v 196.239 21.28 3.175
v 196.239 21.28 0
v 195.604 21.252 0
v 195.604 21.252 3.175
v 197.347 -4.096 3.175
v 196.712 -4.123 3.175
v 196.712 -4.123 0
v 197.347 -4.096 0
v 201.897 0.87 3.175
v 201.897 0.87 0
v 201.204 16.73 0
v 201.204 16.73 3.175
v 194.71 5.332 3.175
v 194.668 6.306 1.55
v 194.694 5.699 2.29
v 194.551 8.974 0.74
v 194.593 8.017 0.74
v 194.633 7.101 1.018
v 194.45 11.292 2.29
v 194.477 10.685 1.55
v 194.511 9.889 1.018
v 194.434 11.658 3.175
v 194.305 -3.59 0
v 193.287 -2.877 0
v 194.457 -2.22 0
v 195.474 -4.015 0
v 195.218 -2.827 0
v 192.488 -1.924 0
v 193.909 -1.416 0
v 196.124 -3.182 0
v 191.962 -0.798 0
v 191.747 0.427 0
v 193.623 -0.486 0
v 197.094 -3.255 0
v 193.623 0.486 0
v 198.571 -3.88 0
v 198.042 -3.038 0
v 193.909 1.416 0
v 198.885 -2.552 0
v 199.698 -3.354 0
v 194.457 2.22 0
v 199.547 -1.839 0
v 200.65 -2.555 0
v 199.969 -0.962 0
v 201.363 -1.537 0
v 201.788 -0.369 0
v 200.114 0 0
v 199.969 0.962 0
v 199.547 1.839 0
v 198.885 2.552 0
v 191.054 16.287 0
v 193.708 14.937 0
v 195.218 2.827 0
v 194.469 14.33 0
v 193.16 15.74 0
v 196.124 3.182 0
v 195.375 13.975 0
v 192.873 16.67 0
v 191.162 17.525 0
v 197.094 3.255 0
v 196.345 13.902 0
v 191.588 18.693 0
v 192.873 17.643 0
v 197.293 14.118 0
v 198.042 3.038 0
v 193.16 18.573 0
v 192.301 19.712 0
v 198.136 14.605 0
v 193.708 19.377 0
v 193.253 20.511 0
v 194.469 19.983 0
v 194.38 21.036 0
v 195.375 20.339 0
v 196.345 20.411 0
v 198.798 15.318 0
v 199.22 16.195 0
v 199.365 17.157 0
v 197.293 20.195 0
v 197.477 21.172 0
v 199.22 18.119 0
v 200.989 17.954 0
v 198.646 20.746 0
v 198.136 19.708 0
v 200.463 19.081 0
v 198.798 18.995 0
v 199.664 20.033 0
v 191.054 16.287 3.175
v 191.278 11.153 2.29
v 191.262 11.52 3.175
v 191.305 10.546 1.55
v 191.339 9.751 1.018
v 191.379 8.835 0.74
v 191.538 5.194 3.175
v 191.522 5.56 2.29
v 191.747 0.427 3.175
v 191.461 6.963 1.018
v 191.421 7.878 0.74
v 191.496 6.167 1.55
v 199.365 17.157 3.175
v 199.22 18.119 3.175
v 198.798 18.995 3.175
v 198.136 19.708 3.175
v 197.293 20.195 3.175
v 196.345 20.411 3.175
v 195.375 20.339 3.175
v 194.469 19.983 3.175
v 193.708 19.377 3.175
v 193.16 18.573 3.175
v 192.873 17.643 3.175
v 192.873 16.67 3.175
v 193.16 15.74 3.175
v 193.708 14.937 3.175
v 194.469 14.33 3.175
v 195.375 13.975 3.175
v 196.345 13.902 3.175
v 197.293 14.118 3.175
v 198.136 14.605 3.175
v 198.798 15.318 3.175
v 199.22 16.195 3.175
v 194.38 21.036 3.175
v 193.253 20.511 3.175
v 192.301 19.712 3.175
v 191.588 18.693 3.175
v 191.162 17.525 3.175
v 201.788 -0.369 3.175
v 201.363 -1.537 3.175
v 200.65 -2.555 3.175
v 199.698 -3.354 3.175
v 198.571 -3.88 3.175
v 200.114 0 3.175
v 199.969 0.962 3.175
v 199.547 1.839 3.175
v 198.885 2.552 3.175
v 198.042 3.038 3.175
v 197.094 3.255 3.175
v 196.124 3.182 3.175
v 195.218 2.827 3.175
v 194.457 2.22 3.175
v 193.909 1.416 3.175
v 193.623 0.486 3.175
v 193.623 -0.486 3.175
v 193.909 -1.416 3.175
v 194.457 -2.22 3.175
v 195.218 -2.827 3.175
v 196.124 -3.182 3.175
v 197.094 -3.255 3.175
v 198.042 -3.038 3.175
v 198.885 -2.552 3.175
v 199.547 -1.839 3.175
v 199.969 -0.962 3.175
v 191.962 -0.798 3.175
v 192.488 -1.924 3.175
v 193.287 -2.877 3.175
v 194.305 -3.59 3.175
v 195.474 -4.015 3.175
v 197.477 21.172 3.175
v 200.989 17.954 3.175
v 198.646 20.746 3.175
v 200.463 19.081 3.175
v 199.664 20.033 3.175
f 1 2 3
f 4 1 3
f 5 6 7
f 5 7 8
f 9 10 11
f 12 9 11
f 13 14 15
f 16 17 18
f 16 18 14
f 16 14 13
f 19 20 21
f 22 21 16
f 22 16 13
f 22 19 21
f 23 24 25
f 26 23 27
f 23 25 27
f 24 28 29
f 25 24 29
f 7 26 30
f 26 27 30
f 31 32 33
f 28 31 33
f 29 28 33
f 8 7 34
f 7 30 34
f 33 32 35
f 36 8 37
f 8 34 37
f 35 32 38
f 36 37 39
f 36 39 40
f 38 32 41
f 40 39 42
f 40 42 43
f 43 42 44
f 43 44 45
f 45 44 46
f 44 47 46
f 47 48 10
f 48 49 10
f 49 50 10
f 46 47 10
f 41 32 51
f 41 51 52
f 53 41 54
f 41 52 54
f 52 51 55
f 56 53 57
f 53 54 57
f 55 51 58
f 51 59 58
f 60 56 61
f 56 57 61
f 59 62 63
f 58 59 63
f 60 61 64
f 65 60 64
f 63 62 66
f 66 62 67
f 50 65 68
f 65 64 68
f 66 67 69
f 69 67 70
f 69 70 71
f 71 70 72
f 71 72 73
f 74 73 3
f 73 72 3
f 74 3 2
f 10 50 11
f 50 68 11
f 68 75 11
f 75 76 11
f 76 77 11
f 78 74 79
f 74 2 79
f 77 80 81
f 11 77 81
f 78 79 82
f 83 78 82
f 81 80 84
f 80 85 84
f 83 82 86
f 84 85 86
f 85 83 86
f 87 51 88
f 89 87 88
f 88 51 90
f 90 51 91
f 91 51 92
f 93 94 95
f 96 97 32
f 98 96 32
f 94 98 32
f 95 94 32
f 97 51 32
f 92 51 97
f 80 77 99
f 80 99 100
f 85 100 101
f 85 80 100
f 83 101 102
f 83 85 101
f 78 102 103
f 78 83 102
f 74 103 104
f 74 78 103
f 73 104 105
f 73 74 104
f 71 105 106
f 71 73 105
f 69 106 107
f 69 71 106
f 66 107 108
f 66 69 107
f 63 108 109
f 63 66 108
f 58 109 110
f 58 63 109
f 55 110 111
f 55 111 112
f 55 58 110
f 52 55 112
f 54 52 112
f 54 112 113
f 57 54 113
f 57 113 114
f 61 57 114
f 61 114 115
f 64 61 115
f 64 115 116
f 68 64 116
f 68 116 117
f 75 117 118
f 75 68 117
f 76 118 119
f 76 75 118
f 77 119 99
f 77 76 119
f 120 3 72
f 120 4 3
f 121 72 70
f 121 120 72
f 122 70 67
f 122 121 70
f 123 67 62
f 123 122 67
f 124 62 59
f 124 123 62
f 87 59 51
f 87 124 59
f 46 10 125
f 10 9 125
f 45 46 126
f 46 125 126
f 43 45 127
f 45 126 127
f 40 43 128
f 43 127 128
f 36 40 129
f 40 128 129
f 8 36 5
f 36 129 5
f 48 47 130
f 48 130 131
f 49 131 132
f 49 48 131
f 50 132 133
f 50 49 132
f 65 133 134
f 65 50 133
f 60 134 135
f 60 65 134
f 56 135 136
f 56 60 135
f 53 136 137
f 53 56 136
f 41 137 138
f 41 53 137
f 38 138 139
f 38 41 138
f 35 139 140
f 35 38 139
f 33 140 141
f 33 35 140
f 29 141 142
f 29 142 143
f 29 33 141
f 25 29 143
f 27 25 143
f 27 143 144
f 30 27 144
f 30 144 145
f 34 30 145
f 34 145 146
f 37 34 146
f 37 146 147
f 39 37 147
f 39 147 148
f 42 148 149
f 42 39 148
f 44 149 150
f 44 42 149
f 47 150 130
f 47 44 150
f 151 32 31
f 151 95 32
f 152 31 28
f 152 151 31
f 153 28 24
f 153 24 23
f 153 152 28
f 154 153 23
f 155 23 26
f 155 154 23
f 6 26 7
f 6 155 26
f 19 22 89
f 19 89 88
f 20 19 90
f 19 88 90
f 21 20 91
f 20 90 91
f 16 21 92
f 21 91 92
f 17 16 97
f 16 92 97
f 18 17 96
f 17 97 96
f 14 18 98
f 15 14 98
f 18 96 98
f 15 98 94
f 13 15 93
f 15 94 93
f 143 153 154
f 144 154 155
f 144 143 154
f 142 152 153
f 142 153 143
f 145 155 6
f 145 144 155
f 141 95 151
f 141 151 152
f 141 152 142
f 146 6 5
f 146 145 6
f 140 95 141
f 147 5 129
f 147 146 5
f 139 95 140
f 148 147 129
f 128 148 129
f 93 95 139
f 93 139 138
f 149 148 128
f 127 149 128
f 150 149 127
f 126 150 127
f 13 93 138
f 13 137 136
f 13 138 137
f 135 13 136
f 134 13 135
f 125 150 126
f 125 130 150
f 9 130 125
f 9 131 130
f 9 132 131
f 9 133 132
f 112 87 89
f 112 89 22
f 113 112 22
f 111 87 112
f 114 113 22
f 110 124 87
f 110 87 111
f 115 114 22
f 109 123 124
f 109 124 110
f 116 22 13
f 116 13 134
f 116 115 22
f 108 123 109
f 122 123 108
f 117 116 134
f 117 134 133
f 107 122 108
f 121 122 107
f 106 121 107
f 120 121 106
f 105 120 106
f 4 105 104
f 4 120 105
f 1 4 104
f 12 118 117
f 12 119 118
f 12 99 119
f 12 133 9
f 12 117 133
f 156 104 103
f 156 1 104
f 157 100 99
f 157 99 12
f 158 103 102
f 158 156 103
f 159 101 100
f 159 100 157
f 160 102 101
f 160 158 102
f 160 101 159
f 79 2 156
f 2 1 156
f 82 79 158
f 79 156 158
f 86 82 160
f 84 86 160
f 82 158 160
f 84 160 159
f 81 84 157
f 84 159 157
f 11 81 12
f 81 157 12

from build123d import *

# Parameters (mm, degrees)
SKETCH1_R           = 3.2639
BOSS_EXTRUDE1_DEPTH = 3.175
FILLET1_R           = 4.7625
SKETCH2_R           = 3.2639
CUT_EXTRUDE1_DEPTH  = 3.175


with BuildPart() as part:
    # Sketch1 → Boss-Extrude1 (new body)
    with BuildSketch(Plane.XY):
        Polygon((200.996661906, 21.487802882), (190.846331975, 21.044629906), (191.954264414, -4.331194922), (202.104594345, -3.888021946), align=None)
        with Locations((196.85, 0)):
            Circle(SKETCH1_R, mode=Mode.SUBTRACT)
        with Locations((196.100926319, 17.15660796)):
            Circle(SKETCH1_R, mode=Mode.SUBTRACT)
    extrude(amount=BOSS_EXTRUDE1_DEPTH)

    # Fillet1
    fillet1_edges = [part.edges().sort_by_distance(p)[0] for p in [
        (202.104594345, -3.888021946, 1.5875),
        (191.954264414, -4.331194922, 1.5875),
        (190.846331975, 21.044629906, 1.5875),
        (200.996661906, 21.487802882, 1.5875),
    ]]
    fillet(fillet1_edges, radius=FILLET1_R)

    # Sketch2 → Cut-Extrude1 (cut)
    with BuildSketch(Plane(origin=(191.400298194, 8.356717492, 0), x_dir=(0, 0, 1), z_dir=(-0.9990482215818578, -0.043619387365334696, 0))):
        with Locations((3.96875, 0)):
            Circle(SKETCH2_R)
    extrude(amount=-CUT_EXTRUDE1_DEPTH, mode=Mode.SUBTRACT)


solid = part.part
